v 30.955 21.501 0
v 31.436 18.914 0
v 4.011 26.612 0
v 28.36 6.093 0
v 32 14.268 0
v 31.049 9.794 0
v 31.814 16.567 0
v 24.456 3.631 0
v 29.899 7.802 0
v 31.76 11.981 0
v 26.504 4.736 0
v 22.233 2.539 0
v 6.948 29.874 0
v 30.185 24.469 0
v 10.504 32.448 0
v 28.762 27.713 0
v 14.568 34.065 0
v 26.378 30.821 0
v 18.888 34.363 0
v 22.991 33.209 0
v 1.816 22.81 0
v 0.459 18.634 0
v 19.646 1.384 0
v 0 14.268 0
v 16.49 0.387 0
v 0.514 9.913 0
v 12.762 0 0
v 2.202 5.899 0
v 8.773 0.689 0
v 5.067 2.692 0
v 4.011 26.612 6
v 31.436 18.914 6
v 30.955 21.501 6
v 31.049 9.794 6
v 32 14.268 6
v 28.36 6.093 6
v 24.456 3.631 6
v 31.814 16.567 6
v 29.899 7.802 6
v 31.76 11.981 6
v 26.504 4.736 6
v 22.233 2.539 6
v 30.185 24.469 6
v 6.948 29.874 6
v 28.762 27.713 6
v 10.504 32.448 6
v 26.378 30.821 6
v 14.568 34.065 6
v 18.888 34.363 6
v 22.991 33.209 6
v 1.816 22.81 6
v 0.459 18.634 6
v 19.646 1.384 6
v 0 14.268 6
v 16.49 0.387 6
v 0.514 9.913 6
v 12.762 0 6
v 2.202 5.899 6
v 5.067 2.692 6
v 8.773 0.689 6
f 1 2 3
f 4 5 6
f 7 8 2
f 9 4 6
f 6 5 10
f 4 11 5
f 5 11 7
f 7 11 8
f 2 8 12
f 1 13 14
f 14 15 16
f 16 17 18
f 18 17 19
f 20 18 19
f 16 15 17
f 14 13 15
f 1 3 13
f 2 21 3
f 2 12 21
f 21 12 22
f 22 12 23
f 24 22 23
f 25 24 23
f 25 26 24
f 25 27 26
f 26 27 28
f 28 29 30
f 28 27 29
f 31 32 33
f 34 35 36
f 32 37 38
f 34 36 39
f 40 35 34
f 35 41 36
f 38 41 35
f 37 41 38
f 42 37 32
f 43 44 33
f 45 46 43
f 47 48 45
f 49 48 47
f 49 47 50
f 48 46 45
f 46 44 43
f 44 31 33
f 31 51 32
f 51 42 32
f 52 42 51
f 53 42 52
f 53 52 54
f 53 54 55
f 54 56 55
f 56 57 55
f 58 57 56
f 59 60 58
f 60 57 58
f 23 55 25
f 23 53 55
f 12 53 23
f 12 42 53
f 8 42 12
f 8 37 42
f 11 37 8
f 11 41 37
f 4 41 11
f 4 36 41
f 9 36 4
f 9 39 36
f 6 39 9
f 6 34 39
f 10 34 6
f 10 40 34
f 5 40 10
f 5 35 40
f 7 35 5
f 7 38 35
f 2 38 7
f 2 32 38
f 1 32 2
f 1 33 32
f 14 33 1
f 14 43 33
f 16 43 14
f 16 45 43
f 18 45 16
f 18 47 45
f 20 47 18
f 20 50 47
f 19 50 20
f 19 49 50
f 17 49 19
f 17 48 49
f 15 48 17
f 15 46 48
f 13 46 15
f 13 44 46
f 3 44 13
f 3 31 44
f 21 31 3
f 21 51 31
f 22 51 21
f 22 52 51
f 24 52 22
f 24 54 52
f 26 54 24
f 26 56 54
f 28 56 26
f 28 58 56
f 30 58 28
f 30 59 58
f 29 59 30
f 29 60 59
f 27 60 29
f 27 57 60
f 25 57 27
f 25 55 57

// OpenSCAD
$fn = 32;

// ----------------------------------------------------------------------
// Cam disc: base radius 11.0 mm, lift 10.0 mm, 30 profile points
// ----------------------------------------------------------------------

// --- parameters (mm) ---
profile_height = 6;       // extrusion height
profile_points = 30;      // points of the closed outline

profile = [[32, 14.268], [31.814, 16.567], [31.436, 18.914], [30.955, 21.501], [30.185, 24.469], [28.762, 27.713], [26.378, 30.821], [22.991, 33.209], [18.888, 34.363], [14.568, 34.065], [10.504, 32.448], [6.948, 29.874], [4.011, 26.612], [1.816, 22.81], [0.459, 18.634], [0, 14.268], [0.514, 9.913], [2.202, 5.899], [5.067, 2.692], [8.773, 0.689], [12.762, 0], [16.49, 0.387], [19.646, 1.384], [22.233, 2.539], [24.456, 3.631], [26.504, 4.736], [28.36, 6.093], [29.899, 7.802], [31.049, 9.794], [31.76, 11.981]];  // single closed polygon, 30 points, counter clockwise

// --- the one profile operation ---
linear_extrude(height = profile_height) polygon(points = profile);
